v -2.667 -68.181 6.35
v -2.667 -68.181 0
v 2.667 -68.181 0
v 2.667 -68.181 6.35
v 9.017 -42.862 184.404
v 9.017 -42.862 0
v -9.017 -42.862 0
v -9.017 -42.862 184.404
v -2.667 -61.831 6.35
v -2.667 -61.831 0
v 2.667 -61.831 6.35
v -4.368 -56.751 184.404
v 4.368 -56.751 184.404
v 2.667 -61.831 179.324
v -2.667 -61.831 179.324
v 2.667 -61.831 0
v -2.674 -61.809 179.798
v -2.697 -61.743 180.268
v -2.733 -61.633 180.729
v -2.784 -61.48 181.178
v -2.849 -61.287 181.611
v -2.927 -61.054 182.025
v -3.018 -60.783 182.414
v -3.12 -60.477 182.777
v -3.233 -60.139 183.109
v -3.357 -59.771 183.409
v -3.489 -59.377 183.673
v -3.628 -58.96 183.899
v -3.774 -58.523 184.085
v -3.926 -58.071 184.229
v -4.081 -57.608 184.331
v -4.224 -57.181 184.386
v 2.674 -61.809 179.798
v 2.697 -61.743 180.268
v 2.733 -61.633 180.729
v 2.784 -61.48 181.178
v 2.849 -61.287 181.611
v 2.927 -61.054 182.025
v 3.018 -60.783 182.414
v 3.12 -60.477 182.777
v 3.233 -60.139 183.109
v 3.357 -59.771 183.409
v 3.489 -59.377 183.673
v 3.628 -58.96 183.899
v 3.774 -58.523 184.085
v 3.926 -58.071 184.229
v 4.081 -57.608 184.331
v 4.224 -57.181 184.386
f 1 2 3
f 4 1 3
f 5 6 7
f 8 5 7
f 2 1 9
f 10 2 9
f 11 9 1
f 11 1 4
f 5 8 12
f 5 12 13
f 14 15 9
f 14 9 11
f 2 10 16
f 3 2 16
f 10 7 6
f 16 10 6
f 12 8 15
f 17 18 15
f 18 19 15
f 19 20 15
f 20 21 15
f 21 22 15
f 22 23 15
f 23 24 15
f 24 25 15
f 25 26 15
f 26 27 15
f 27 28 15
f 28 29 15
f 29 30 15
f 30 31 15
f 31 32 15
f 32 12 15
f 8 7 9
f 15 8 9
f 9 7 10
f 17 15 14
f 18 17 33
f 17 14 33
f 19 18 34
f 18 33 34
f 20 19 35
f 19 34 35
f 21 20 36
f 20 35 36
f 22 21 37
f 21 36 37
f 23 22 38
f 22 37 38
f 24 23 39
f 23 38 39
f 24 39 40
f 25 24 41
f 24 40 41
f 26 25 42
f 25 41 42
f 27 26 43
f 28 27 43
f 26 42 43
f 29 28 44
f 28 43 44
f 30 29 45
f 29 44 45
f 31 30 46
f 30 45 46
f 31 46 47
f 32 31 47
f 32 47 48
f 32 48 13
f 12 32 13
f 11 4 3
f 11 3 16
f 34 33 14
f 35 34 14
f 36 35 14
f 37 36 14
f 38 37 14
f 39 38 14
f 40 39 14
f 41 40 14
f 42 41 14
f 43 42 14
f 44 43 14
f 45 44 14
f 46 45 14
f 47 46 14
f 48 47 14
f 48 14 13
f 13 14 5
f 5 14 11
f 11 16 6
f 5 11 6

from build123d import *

# Parameters (mm, degrees)
F1_DEPTH = 184.404
F0_W     = 5.334
F0_H     = 6.35
F2_DEPTH = 6.35
F3_R     = 5.08


with BuildPart() as f1:
    # F0 (on Top) → F1 (new body)
    with BuildSketch(Plane.XY):
        Polygon((9.017, -42.8625), (-9.017, -42.8625), (-2.667, -61.831036), (2.667, -61.831036), align=None)
    extrude(amount=F1_DEPTH)

    # F0 (on Top) → F2 (join)
    with BuildSketch(Plane.XY):
        with Locations((0, -65.006036)):
            Rectangle(F0_W, F0_H)
    extrude(amount=F2_DEPTH)

    # F3
    f3_edges = [f1.edges().sort_by_distance(p)[0] for p in [
        (0, -61.831036, 184.404),
    ]]
    fillet(f3_edges, radius=F3_R)


solid = f1.part
